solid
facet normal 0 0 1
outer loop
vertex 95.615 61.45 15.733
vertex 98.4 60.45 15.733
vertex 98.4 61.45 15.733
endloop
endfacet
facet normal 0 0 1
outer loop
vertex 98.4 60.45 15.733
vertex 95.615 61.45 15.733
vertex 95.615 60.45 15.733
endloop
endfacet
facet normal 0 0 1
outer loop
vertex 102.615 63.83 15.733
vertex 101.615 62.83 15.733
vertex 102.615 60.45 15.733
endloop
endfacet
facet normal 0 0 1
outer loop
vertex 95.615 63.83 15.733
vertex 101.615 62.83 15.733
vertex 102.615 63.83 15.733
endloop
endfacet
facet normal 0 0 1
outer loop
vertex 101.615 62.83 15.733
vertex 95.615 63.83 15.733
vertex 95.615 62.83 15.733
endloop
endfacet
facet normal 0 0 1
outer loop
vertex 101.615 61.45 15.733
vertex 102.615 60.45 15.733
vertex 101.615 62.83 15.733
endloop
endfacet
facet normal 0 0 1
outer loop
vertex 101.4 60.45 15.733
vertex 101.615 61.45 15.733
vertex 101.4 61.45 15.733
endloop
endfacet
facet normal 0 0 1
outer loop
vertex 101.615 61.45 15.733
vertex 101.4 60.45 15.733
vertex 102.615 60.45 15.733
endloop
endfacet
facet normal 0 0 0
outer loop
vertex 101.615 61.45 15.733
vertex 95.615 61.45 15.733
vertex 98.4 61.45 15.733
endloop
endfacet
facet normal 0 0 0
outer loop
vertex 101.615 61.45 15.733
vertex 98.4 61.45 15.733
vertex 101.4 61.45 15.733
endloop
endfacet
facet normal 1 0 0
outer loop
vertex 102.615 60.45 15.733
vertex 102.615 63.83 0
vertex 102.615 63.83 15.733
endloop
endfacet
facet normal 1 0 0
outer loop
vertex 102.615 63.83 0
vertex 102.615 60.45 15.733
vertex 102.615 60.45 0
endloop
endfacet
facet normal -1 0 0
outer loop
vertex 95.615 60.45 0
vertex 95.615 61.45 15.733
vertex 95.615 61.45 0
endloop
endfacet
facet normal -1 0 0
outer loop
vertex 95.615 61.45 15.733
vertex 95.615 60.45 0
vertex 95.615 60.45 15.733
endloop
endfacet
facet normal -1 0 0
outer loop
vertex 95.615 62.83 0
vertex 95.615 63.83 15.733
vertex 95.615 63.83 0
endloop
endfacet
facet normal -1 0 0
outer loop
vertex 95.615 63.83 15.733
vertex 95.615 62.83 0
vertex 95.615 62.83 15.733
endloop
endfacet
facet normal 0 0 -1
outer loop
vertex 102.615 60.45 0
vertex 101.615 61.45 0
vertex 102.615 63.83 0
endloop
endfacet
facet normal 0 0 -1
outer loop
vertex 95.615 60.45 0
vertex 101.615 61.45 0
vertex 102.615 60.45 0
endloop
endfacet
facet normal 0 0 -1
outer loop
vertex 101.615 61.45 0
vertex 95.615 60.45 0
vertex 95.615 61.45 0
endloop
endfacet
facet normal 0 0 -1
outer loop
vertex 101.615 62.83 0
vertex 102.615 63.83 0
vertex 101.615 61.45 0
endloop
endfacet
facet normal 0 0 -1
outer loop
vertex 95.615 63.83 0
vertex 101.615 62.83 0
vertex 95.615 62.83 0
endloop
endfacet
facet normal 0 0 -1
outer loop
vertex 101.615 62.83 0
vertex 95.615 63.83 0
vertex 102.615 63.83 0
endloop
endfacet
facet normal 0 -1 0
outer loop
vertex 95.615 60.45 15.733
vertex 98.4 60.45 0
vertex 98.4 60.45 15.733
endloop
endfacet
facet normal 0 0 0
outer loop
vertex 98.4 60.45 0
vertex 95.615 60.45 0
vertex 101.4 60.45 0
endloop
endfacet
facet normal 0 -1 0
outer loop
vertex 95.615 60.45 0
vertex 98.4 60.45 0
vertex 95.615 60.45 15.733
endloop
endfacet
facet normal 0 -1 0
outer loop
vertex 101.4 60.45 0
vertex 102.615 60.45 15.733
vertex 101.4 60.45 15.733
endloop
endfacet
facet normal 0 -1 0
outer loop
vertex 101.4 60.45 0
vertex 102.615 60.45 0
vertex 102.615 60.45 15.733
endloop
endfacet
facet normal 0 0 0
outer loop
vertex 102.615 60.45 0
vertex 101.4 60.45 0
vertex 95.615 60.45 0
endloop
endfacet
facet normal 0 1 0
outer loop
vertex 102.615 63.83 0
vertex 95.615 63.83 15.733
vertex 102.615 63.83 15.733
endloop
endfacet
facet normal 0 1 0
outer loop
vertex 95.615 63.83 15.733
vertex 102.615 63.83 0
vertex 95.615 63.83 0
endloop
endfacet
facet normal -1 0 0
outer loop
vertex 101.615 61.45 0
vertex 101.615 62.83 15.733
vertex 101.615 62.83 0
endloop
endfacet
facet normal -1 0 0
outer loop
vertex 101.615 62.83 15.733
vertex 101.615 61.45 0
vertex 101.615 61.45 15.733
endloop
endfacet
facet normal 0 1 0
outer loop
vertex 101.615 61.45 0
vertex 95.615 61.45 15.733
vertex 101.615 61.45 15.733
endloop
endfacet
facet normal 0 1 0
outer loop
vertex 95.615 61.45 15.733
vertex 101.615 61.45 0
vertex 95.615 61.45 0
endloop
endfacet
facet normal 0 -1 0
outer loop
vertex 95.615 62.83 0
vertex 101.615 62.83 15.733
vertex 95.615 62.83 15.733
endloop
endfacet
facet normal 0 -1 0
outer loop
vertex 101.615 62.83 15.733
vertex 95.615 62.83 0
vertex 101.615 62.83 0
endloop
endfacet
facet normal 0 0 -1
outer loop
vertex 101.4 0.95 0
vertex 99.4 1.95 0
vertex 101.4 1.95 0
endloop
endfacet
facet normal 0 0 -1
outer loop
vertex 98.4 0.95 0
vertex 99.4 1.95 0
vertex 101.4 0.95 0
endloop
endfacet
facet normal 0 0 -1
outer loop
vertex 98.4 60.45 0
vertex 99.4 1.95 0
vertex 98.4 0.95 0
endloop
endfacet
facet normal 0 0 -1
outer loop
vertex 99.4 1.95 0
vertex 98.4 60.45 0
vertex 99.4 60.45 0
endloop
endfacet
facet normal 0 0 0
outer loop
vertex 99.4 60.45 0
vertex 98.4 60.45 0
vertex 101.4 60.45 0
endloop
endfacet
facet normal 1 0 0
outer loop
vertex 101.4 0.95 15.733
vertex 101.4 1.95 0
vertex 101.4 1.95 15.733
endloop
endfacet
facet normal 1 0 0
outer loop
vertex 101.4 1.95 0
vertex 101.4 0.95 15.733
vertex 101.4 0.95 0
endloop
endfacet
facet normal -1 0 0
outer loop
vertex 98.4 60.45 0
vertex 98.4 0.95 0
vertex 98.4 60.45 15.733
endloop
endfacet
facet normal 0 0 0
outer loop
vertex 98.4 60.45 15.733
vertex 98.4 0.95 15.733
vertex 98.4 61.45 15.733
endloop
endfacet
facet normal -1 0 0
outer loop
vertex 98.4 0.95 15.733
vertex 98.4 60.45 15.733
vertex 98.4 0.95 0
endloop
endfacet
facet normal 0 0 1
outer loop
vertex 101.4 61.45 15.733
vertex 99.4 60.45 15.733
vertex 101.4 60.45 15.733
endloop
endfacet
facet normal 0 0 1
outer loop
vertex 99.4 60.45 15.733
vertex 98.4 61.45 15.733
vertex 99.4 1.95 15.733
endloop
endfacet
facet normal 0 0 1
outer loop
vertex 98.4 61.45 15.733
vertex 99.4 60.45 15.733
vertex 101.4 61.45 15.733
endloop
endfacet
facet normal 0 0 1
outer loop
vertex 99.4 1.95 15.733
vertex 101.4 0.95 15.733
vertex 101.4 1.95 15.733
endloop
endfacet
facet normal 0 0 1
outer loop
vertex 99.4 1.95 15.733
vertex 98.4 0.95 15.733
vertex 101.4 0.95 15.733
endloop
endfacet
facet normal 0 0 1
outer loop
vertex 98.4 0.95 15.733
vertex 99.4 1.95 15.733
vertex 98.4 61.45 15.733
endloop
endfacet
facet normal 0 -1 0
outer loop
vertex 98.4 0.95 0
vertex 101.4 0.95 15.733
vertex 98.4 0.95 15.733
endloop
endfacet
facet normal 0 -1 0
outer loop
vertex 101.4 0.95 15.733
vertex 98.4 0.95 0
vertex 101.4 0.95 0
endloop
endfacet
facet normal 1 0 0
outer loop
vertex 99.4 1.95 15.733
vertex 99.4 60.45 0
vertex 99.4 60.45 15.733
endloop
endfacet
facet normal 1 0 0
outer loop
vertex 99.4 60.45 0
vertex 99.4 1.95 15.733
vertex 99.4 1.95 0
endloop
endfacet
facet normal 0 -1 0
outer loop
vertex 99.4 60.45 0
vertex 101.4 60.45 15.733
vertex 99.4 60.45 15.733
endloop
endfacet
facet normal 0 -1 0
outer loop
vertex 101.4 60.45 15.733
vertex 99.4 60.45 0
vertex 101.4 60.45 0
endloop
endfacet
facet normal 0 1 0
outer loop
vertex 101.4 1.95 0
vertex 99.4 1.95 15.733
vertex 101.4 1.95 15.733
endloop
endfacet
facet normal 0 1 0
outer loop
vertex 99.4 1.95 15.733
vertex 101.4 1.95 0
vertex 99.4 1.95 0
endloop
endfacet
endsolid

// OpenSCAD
// file: testRC.scad
use<mylib.scad>;

// clang-format off
// test rc
module testRC() {
  // rid: plane of corner cut
  // rot: applied to given cube to put in in plane of rid
  module test(idc, rid, rot, cxyz, trans, ss = true) {
    if (idc)
    rc(trans[0], rid, 0, 5, t0, ss)
    rc(trans[1], rid, 1, 5, t0, ss)
    rc(trans[2], rid, 2, 5, t0, ss)
    rc(trans[3], rid, 3, 5, t0, ss)
    rotate(rot) color (idc)  cube(cxyz, true); // Y -> X
  }
  module test0(idc, rid, rot, cxyz, trans, ss= false) {
    rrot = [ [ 0, -90, 0 ], [ -90, 0, 0 ], [ 0, 0, -90 ] ][rid];
    if (idc) 
    rc0(trans[0], rid, 0, 5, t0, ss)
    rc0(trans[1], rid, 1, 5, t0, ss)
    rc0(trans[2], rid, 2, 5, t0, ss)
    rc0(trans[3], rid, 3, 5, t0, ss)
    rotate(rot) color(idc)  cube(cxyz, true); // Y -> X
  }
  t = t0;
  sz = false;
  szx = false;
  szy = false;
  sx = false;
  sy0 = false; //"green";
  syx = false;
  syxc = false;// "#BBBBBB";
  syz = "red";

  // rc() WORKS without test module!
  tt=.5; // offset because cube is rotated but not centered
  color("cyan") translate([20, 5, 0]) 
  rc([0,20,tt], 2, 0, 5, t0,true) 
  rc([20,20,tt], 2, 1, 5,t0,true) 
  rc([20,0,tt], 2, 2, 5, t0,true)
  rc([0,00,tt], 2, 3, 5, t0,true) 
  cube([20, 20, t0]);

  // original test with rc0() [implicit gold]
  translate([-10, -30, 0]) 
  rc0([0,00,0], [0, 0, 0], 0, 5, t0,true) 
  rc0([0,20,0], [0, 0, 0], 1, 5,t0,true) 
  rc0([20,20,0], [0, 0, 0], 2, 5, t0,true)
  rc0([20,00,0], [0, 0, 0], 3, 5, t0,true) 
  cube([20, 20, t0]);

  gold = "gold";
  // z-axis test: using test0; fails because of module!
  translate([25, -20, 0]) 
  test0(gold, 2, [0, 0, 0], [20, 20, t0], [
    [-10,-10,-tt], [-10,10,-tt],[10,10,-tt], [10,-10,-tt]
  ], true) 

  // native Y -> X [green] (first test)
  test(syxc, 0, [0,0,-90], [20, t, 20], [
    [00,-10,-10],
    [00, 10,-10],
    [00, 10, 10],
    [00, -10,10]
    ]);
  // native Y -> Y [grey]
  test(sy0, 1, [0,0,0], [20, t, 20], [
    [-10,00,10],
    [-10,00,-10],
    [10,00,-10],
    [10,00,10],
  ]);

  // native Y -> Z [red]
  test(syz, 2, [-90,0,0], [20, t, 20], [
    [-10,10,00],
    [10,10,00],
    [10,-10,00],
    [-10,-10,00],
  ]);

  // native Y -> Z [red]
  *if (syz) color (syz) 
  translate([0, 0, 0]) 
  rc0([00,20,0], [0, 0, -90], 0, 5, 1, syz) 
  rc0([20,20,00], [0, 0, -90], 1, 5, 1, syz) 
  rc0([20,00,00], [0, 0, -90], 2, 5, 1, syz)
  rc0([0,0,0], [0, 0, -90], 3, 5, 1, syz) 
  rotate([-90,0,0]) cube([20, t0, 20]); // y -> Z

  // native Z:
  if (sz) color(sz)
  translate([0, 0, 0]) 
  rc0([0,00,0], [0, 0, 0], 0, 5, 1, sz) 
  rc0([0,20,0], [0, 0, 0], 1, 5, 1, sz) 
  rc0([20,20,0], [0, 0, 0], 2, 5, 1, sz)
  rc0([20,00,0], [0, 0, 0], 3, 5, 1, sz) 
  cube([20, 20, t0]); // native: normal to Z

  // native Z rotated to X
  if (szx) color(szx)
  translate([0, 0, 0]) 
  rc0([0,00,0], [0, -90, 0], 0, 5, 1, szx) 
  rc0([0,20,0], [0, -90, 0], 1, 5, 1, szx) 
  rc0([0,20,20], [0, -90, 0], 2, 5, 1, szx)
  rc0([0,00,20], [0, -90, 0], 3, 5, 1, szx) 
  rotate([0, -90, 0]) cube([20, 20, t0]); 

  // native Z rotated to Y
  if (szy) color(szy)
  translate([0, 0, 0]) 
  rc0([0,00,0], [-90, 0, 0], 0, 5, 1, szy) 
  rc0([0,0,-20], [-90, 0, 0], 1, 5, 1, szy) 
  rc0([20,0,-20], [-90, 0, 0], 2, 5, 1, szy)
  rc0([20,00,0], [-90, 0, 0], 3, 5, 1, szy) 
  rotate([-90, 0, 0]) cube([20, 20, t0]);

  // if (sy0) color (sy0) 
  // translate([0, 0, 0]) 
  // rc0([00,00,20], [-90, 0, 0], 0, 5, 1, sy0) 
  // rc0([00,00,00], [-90, 0, 0], 1, 5, 1, sy0) 
  // rc0([20,00,00], [-90, 0, 0], 2, 5, 1, sy0)
  // rc0([20,00,20], [-90, 0, 0], 3, 5, 1, sy0) 
  // cube([20, t0, 20]); // native normal = y

  // native Y -> X [green]
  if (syx) color (syx) 
  translate([0, 0, 0]) 
  rc0([00,-20,00], [0, -90, 0], 0, 5, 1, syx) 
  rc0([00,00,00], [0, -90, 0], 1, 5, 1, syx) 
  rc0([0,00,20], [0, -90, 0], 2, 5, 1, syx)
  rc0([0,-20,20], [0, -90, 0], 3, 5, 1, syx) 
  rotate([0,0,-90]) cube([20, t0, 20]); // Y -> X


}
// clang-format on
// main file
use <mylib.scad>;
p = .001;
pp = 2 * p;
t0 = 1;
// box to store & display cards

l00 = 87; // official card size (+2mm for sleeves)
w00 = 56; // official card size (+2mm for sleeves)
t00 = .4; // card thickness: sleeves bring thickness to ~.625 per card. (from min .4mm)
t01 = .625; // thickness when stacking sleeved cards
// dimension of sleeved cards:
l0 = 92.4;
w0 = 60.4; // w00 + 2mm (sleeves) + 2mm (slack); retain 60.4 for slider compat
h0 = 27;
h1 = h0 + 3; // extend for ramp!
l = l0 + 2 * t0;
w = w0 + 2 * t0;
h = h1 + t0;
tsd = 1.7;      // top_slot depth of topTray

// hypotenuse: given angle * adjacent_base length
function hypa(a, b) = (let(h = b * tan(a)) sqrt(b * b + h * h));
function hypo(a, h) = (let(b = h / tan(a)) sqrt(b * b + h * h));

a = 18;
dz = 6;                 // top of slot
iw = 3.5;               // width of slot_interior
xb = (h - dz) * tan(a); // length of holder after tilt...
lt = l + xb;            // length total
echo("cardbox: xb, lt, lwh=", [ xb, lt, l, w, h ]);
// TODO: snap-on top!

/** angled box on end to hold selected cards at angle (a) */
module holder(a = a)
{
  xb = (h - dz) * tan(a); // length of holder after tilt...
  ha = (h - dz);
  echo();                // top to slot
  fw = iw + 2 * t0;      // full width of slot box
  hb = ha - fw / cos(a); // down from top to rotation point
  hr = ha - hb;
  sz = 8;   // depth to shelf
  echo("xb=", xb, "ha=", ha, "hb=", hb, "hr=", hr);
  wb = w0;
  intersection()
  {
    translate([ p - xb, 0, 0 ]) cube([ xb, w, h ]);
    {
      rotatet([ 0, -a, 0 ], [ 0, 0, dz ])
      {
        translate([ fw, 0, 0 ]) cube([ 7, w, 1.2 * h ]); // fill w/ giant block, then intersect
        {
        bh = t0 + ((a > 1) ? ha / cos(a) : ha);
        // echo("bh=", bh);
        translate([ 0, 0, dz ]) 
        box([ fw, w, bh ], t0); // main box

        translate([ 0, 0, bh - sz ]) 
        rotatet([ 0, -18, 0 ], [ iw, 0, 2 * t0 ])
        cube([ iw + t0, w, t0 ]); // bottom shelf
        }
      }
    }
  }
  // translate([-t0,0,-bl]) rotate([-90,0,0]) cylinder([iw+2*t0, w, bl]);
}

module card(tr = [ (l0 - l00) / 2, (w0 - w00) / 2, 0 ])
{
    translate(tr) astack(32, [ -.03, 0, t01 ]) color("pink") roundedCube([ l00, w00, t00 ], 3, true);
}

// vz: height of ramp @ vx: bump @
vz = 4.0;
vx = t00 * l;
fl = 2;
vy = 5.6; // fl: flat length
module ramp(vx = vx, vz = vz, ve = 0)
{
    sa = sin(a2);
    ca = cos(a2);
    vz = (l - vx) * sa;
    vzt = vz + t0; // vz = 3.16
    intersection()
    {
        union()
        {
            rotatet([ 0, -a2-.2, 0 ], [ vx, 0, vz + t0 ]) 
            for (y = [0:(w - vy) / 4:w - vy]) 
            translate([ ve, y, 0 ])
              cube([ vx, vy, vz + t0 ]);
            translate([ vx, 0, 0 ]) cube([ 2.4, w, vz + t0 ]);
        }
        translate([ ve, 0, 0 ]) cube([ vx, w, vz + t0 ]);
    }
    dr = 14;
    intersection()
    {
        translate([ vx + (dr / 2 + .0) * t0, w / 2, vzt / 2 ]) rotate([ -90, 0, 0 ]) cube([ dr, vzt, w ], true);
        color("blue") translate([ vx + (dr / 2 + 0) * t0, w / 2, vzt / 2 ])
            rotatet([ 0, a2, 0 ], [ -dr / 2, 0, vzt / 2 ]) rotate([ -90, 0, 0 ])
                cube([ dr, vzt, w ], true); // no compound rotation!
    }
}
/* clang-format off */

/** try to hold inline cards, also a "lid" to hold cards in box
 @param dx length of tray
 @param dz height of wings (below tsd)
 @ambient w: width of box, t0: thickness
 */
module topTray(dx = l/4, dz = 2)
{
    f = .43;
    tw = w +.75;
    sw = 2 * t0;
    atrans(loc, [ [ l+4, 0, dx, [0, 90, 0] ], 
                [ (l-dx)/2+20, 0, h-dz-tsd- t0 ], 
                1,
                0,
                0,
          ])
    /* clang-format on */
    {
        rz = dz; pz = 3;
        in = -.05;   // negative: apply pressure to sidewall
        dw = 3*t0 + f; // width of clip: sidewalls=2*t0 + slot=(t0+ic)
        iw = t0+in; // indent the tray
        dup([ 0, w, 0, [0, 0, 180, [dx/2, 0, 0]]])
          color("cyan") translate([0, 2*t0-(dw), f/2-pz]) // up=f/2 for visual clarity
          box([dx, dw+in, rz+pz+2], [0-pp, t0, -t0], [2, 2, 0]);
      translate([0, iw, 0]) box([ dx, w-2*iw, rz+1 ], [-t0,t0,t0], [2,2,0]);
    }
}


// box for setup (Events, VICI, markers, chips) cards:
// ambient:
// l length of box
// w width of box
//
module vbox()
{
  sh = 3.4; // center slot reduction & lid size
  vw = l + 2; // more slack for lid...
  vl = 20+2*t0;
  vh = w0 + sh + t0 +t0; // about as high as main box is wide (+2 for )
  sw = 55;// total width of box
  dh = 19+sh; // depth of slot
  sr = min(5, dh/2, sw/2);
  hwtr = [dh, sw, 2*t0, sr];
  h2 = w0;  // center slot height
  sz = 11/32 * vl; // 11 +/- 1
  ss = false;

  l1y = w + 2 * (vl + 3*t0); // l1y = w+vh
  l0y = l1y; // 0 -3*t0; 
  echo("------h2=", h2, "vh=", vh);
  module vboxTop() {
    // bt = (vh-h2); // mm == 2*sh
    tt = t0*1.2; bt = sh+tt; fx = .25; fy = .25;
    atrans(loc, [
        [-vw/2-2*t0, l0y-vl/2,       0, [0, 0, 90]], 
        0,
        [ vw/2     , l1y-vl/2, vh+tt+p, [180,0,90]],
        undef,
        undef,
        0,
        ])
    {
    // color("cyan")
    // union(){
     translate([0, 0, tt/2]) cube([vl, vw, tt], center=true);
     box(lwh = [vl-2*t0-fx, vw-2*t0-fy, tt+bt], cxy=true);
    // }
    }
  }
  module cardGuide() {
    up = 10; h1 = 10; h2 = 10; cy=0; a = 6; df = 4;
    union() {
    translate([0, 0, vh/2+up+df/2 ])
    rotate([0, 90-a, 0]) color("green") cube([h1, vl, t0+1], true);
    translate([0, 0, vh/2+up-df/2-(h2+h1)/2, ])
    rotate([0, 90+a, 0]) color("green") cube([h2, vl, t0+1], true);
    translate([.0, 0, vh/2+up/2, ])
    cube([t0+2, vl, df+t0, ], true);
    }
  }
  // temp union for 'intersection' test
  // intersection() 
  {
  // vbox:
  atrans(loc, [
               [0, l0y, 0, [0,0,-90]], 
               [0, l1y, 0, [0,0,-90]], 
               2, undef, undef, 1
               
               ]) 
  { 
  //   echo("vbox2:", hwtr)
    slotify(hwtr, [00+t0/2, vw/2, vh-(dh/2-sr)], 1, 3, ss)
    slotify(hwtr, [vl-t0/2, vw/2, vh-(dh/2-sr)], 1, 3, ss)
    box([vl, vw, vh], t0);
  dh2 = dh-(vh-h2); hwtr2 = [dh2, sw, 2*t0, sr];
  slotify(hwtr2, [sz+t0/2, vw/2, h2-(dh2/2-sr)], 1, 3, false)
    div([h2, vw, sz], 2, 0, t0);
    translate([vl/2,     (t0+.6), 0 ]) rotate([0,0, 90]) cardGuide();
    translate([vl/2, vw- (t0+.6), 0 ]) rotate([0,0,-90]) cardGuide();
  }
  vboxTop();
  }
}

// add horizontal slot to children(0)
module hslot(dz = dz, dx = 0)
{
    sw = 2;
    sh = 4;
    difference()
    {
        union()
        children();
        translate([dx - (sw - pp) / 2, t0, dz - sh ]) 
        cube([ sw, w0, sh ]);
    }
    // support posts:
    ni = 6;
    posts(sh+pp, [0, w/ni + t0/2, dz - sh - p], [0, w/ni, 0], ni-1);
}

// cut child(0) in XY plane @ depth: y0..y1
module cutaway0(loc = loc, cxyz = [ 10, 10, 10 ], txyz = [ -5, -5, -5 ])
{
    if (loc == 1)
    {
        difference()
        {
            children(0);
            translate(txyz) cube(cxyz);
        }
    }
    else
    {
        children(0);
    }
}
module cutaway(loc = loc)
{
    cutaway0(loc, [ lt + 10, 10, h + 10 ], [ -5 - xb, -5, -5 ]) children();
}

// diagonal pattern
module pat(s = 5, l = 30)
{
    rotatet([ 0, 45, 0 ], [ s / 2, 0, s / 2 ]) translate([ 0, -p, 0 ]) cube([ s, l + pp, s ]);
}

// diagonal pattern tweaked for cardbox
module paty(s = 5, l = w)
{
    scale([ 1, 1, .7 ]) translate([ -s / 4, 0, -s / 2.8 ]) pat(s / 2, l);
}

module gridawayXZ(x0 = 40, l = l * .65, h = 25)
{
    s = 10;
    difference()
    {
        children(0);
        translate([ x0, 0, t0 + s * .8 ]) 
        gridDXZ(l - s - x0, h - s - 5, 5) 
        paty(s, w);
    }
}


module mainBox()
{
  sw = 20; // half width
  sr = 10;  // slot radius
  rq = 3; // rq if different from sr

  sh = 1; sl = (l-20); r = 2; ds = .1;
  hds = 7.0;      // bottom of slot
  slh = h+sr-hds; // slot height: sr at top of box
  ss = false;

  module topSlots() {
    // corner should be: [l, h, w/2 +- sr] => [100.9, 26, 43.2--53.2 (47.2  +- 4)]
    // 2 top-side slots: (fat slow for test)
    slotify2([sl, 5, 2*t0, .1], [l/2, t0/2, 1], 0, undef, true)
    // slotify2([sh, sl, 2*t0, r], [l/2, w-t0/2, h-3], [0,90,90], [2, 0], ss)
      children(0);
  }
  module topSlots0() {
    hds = 1.5;
    difference() {
      children(0);
      show(false) translate([(l-sl)/2, -p, h-tsd]) cube([sl, w+2*t0+pp, tsd+pp]);
    }
  }

  // add slot to end-cap to insert cards on bottom
  // cuts through holder, topslots0(), braces at end
  hslot() 
  {
    holder();
    // end slot:
    slotify([slh, sw, 2*t0, sr], [l-t0/2, w/2, hds+slh/2], 1, [3, 1], ss )
    topSlots0()
        box([ l, w, h ], t0);
    // Brace end of box:
    xx = 3*t0; zz = 7;
    translate([l-xx,0,0]) cube([xx,w,zz/2]);
    translate([l-(xx-t0),0,0]) cube([xx-t0,w,zz]);
    ramp();
  }
}
module slottest() {
  sw = 20; // half width
  sr = 10;  // slot radius
  rq = 3; // rq if different from sr

  sh = 1; sl = (l-20); r = 2; ds = .1;
  hds = 3.5;      // bottom of slot
  slh = h+sr-hds; // slot height: sr at top of box
  rot = [0,0,0]; riq = [2, 0];
  echo("-----SLOTIFY TEST:--------", rot, riq);
  // test: botton slot
    slotify([slh, sw, 2*t0, sr], [l-t0/2+8, w/2, t0/2], [0,0,0, 0], [3, 2], true )
  slotify([sh, sl, 2*t0, r], [l/2, w-t0/2, h], rot, riq, true)
    box([100, w, 25], t0);

}

use<testRC.scad>;
// translate([-50, -40, 0])  testRC();

// mainBox (w/cutaway), cards, vbox, topTray (cards 'lid')
// 0: all, 1: box/cutaway, 2: box & cards & lid, 3: box, 4: trayTop, 5: vbox[2]
loc = 4;
///
/// MAIN BUILD HERE:
///
atrans(loc, [[0,0,0], 0, 0, 0])
  cutaway() gridawayXZ() mainBox();
// slottest();

// topTray:
// dup([-10, 0, 0])
// dup([-10, 0, 0])
// dup([-10, 0, 0])
// dup([-10, 0, 0])
topTray(l/6);

// Two vbox: 5
dup([ 0, -25, 0 ])
 atrans(loc, [[0,0,0], undef, undef, undef, undef, 0])
 vbox();

dy = 10;
dr = 5; // rCube test
// translate([ 0, 0, 0 ]) roundedCube([ dy, dy / 2, 3 ], dr, true);
// roundedRect([ dy, dy ], 1);

// atan(6/88) = 4;
// atan(7/88) = 4.5;
a2 = 3.2; // angle of the card on ramp
atrans(loc, [undef, [0, 0, 0], undef, 0]) // show pink Cards
    translate([ 0, 0, .1 ]) rotatet([ 0, a2, 0 ], [ 90, 0, 1 ]) card([ 4, (w0 - w00) / 2, 1 ]);
